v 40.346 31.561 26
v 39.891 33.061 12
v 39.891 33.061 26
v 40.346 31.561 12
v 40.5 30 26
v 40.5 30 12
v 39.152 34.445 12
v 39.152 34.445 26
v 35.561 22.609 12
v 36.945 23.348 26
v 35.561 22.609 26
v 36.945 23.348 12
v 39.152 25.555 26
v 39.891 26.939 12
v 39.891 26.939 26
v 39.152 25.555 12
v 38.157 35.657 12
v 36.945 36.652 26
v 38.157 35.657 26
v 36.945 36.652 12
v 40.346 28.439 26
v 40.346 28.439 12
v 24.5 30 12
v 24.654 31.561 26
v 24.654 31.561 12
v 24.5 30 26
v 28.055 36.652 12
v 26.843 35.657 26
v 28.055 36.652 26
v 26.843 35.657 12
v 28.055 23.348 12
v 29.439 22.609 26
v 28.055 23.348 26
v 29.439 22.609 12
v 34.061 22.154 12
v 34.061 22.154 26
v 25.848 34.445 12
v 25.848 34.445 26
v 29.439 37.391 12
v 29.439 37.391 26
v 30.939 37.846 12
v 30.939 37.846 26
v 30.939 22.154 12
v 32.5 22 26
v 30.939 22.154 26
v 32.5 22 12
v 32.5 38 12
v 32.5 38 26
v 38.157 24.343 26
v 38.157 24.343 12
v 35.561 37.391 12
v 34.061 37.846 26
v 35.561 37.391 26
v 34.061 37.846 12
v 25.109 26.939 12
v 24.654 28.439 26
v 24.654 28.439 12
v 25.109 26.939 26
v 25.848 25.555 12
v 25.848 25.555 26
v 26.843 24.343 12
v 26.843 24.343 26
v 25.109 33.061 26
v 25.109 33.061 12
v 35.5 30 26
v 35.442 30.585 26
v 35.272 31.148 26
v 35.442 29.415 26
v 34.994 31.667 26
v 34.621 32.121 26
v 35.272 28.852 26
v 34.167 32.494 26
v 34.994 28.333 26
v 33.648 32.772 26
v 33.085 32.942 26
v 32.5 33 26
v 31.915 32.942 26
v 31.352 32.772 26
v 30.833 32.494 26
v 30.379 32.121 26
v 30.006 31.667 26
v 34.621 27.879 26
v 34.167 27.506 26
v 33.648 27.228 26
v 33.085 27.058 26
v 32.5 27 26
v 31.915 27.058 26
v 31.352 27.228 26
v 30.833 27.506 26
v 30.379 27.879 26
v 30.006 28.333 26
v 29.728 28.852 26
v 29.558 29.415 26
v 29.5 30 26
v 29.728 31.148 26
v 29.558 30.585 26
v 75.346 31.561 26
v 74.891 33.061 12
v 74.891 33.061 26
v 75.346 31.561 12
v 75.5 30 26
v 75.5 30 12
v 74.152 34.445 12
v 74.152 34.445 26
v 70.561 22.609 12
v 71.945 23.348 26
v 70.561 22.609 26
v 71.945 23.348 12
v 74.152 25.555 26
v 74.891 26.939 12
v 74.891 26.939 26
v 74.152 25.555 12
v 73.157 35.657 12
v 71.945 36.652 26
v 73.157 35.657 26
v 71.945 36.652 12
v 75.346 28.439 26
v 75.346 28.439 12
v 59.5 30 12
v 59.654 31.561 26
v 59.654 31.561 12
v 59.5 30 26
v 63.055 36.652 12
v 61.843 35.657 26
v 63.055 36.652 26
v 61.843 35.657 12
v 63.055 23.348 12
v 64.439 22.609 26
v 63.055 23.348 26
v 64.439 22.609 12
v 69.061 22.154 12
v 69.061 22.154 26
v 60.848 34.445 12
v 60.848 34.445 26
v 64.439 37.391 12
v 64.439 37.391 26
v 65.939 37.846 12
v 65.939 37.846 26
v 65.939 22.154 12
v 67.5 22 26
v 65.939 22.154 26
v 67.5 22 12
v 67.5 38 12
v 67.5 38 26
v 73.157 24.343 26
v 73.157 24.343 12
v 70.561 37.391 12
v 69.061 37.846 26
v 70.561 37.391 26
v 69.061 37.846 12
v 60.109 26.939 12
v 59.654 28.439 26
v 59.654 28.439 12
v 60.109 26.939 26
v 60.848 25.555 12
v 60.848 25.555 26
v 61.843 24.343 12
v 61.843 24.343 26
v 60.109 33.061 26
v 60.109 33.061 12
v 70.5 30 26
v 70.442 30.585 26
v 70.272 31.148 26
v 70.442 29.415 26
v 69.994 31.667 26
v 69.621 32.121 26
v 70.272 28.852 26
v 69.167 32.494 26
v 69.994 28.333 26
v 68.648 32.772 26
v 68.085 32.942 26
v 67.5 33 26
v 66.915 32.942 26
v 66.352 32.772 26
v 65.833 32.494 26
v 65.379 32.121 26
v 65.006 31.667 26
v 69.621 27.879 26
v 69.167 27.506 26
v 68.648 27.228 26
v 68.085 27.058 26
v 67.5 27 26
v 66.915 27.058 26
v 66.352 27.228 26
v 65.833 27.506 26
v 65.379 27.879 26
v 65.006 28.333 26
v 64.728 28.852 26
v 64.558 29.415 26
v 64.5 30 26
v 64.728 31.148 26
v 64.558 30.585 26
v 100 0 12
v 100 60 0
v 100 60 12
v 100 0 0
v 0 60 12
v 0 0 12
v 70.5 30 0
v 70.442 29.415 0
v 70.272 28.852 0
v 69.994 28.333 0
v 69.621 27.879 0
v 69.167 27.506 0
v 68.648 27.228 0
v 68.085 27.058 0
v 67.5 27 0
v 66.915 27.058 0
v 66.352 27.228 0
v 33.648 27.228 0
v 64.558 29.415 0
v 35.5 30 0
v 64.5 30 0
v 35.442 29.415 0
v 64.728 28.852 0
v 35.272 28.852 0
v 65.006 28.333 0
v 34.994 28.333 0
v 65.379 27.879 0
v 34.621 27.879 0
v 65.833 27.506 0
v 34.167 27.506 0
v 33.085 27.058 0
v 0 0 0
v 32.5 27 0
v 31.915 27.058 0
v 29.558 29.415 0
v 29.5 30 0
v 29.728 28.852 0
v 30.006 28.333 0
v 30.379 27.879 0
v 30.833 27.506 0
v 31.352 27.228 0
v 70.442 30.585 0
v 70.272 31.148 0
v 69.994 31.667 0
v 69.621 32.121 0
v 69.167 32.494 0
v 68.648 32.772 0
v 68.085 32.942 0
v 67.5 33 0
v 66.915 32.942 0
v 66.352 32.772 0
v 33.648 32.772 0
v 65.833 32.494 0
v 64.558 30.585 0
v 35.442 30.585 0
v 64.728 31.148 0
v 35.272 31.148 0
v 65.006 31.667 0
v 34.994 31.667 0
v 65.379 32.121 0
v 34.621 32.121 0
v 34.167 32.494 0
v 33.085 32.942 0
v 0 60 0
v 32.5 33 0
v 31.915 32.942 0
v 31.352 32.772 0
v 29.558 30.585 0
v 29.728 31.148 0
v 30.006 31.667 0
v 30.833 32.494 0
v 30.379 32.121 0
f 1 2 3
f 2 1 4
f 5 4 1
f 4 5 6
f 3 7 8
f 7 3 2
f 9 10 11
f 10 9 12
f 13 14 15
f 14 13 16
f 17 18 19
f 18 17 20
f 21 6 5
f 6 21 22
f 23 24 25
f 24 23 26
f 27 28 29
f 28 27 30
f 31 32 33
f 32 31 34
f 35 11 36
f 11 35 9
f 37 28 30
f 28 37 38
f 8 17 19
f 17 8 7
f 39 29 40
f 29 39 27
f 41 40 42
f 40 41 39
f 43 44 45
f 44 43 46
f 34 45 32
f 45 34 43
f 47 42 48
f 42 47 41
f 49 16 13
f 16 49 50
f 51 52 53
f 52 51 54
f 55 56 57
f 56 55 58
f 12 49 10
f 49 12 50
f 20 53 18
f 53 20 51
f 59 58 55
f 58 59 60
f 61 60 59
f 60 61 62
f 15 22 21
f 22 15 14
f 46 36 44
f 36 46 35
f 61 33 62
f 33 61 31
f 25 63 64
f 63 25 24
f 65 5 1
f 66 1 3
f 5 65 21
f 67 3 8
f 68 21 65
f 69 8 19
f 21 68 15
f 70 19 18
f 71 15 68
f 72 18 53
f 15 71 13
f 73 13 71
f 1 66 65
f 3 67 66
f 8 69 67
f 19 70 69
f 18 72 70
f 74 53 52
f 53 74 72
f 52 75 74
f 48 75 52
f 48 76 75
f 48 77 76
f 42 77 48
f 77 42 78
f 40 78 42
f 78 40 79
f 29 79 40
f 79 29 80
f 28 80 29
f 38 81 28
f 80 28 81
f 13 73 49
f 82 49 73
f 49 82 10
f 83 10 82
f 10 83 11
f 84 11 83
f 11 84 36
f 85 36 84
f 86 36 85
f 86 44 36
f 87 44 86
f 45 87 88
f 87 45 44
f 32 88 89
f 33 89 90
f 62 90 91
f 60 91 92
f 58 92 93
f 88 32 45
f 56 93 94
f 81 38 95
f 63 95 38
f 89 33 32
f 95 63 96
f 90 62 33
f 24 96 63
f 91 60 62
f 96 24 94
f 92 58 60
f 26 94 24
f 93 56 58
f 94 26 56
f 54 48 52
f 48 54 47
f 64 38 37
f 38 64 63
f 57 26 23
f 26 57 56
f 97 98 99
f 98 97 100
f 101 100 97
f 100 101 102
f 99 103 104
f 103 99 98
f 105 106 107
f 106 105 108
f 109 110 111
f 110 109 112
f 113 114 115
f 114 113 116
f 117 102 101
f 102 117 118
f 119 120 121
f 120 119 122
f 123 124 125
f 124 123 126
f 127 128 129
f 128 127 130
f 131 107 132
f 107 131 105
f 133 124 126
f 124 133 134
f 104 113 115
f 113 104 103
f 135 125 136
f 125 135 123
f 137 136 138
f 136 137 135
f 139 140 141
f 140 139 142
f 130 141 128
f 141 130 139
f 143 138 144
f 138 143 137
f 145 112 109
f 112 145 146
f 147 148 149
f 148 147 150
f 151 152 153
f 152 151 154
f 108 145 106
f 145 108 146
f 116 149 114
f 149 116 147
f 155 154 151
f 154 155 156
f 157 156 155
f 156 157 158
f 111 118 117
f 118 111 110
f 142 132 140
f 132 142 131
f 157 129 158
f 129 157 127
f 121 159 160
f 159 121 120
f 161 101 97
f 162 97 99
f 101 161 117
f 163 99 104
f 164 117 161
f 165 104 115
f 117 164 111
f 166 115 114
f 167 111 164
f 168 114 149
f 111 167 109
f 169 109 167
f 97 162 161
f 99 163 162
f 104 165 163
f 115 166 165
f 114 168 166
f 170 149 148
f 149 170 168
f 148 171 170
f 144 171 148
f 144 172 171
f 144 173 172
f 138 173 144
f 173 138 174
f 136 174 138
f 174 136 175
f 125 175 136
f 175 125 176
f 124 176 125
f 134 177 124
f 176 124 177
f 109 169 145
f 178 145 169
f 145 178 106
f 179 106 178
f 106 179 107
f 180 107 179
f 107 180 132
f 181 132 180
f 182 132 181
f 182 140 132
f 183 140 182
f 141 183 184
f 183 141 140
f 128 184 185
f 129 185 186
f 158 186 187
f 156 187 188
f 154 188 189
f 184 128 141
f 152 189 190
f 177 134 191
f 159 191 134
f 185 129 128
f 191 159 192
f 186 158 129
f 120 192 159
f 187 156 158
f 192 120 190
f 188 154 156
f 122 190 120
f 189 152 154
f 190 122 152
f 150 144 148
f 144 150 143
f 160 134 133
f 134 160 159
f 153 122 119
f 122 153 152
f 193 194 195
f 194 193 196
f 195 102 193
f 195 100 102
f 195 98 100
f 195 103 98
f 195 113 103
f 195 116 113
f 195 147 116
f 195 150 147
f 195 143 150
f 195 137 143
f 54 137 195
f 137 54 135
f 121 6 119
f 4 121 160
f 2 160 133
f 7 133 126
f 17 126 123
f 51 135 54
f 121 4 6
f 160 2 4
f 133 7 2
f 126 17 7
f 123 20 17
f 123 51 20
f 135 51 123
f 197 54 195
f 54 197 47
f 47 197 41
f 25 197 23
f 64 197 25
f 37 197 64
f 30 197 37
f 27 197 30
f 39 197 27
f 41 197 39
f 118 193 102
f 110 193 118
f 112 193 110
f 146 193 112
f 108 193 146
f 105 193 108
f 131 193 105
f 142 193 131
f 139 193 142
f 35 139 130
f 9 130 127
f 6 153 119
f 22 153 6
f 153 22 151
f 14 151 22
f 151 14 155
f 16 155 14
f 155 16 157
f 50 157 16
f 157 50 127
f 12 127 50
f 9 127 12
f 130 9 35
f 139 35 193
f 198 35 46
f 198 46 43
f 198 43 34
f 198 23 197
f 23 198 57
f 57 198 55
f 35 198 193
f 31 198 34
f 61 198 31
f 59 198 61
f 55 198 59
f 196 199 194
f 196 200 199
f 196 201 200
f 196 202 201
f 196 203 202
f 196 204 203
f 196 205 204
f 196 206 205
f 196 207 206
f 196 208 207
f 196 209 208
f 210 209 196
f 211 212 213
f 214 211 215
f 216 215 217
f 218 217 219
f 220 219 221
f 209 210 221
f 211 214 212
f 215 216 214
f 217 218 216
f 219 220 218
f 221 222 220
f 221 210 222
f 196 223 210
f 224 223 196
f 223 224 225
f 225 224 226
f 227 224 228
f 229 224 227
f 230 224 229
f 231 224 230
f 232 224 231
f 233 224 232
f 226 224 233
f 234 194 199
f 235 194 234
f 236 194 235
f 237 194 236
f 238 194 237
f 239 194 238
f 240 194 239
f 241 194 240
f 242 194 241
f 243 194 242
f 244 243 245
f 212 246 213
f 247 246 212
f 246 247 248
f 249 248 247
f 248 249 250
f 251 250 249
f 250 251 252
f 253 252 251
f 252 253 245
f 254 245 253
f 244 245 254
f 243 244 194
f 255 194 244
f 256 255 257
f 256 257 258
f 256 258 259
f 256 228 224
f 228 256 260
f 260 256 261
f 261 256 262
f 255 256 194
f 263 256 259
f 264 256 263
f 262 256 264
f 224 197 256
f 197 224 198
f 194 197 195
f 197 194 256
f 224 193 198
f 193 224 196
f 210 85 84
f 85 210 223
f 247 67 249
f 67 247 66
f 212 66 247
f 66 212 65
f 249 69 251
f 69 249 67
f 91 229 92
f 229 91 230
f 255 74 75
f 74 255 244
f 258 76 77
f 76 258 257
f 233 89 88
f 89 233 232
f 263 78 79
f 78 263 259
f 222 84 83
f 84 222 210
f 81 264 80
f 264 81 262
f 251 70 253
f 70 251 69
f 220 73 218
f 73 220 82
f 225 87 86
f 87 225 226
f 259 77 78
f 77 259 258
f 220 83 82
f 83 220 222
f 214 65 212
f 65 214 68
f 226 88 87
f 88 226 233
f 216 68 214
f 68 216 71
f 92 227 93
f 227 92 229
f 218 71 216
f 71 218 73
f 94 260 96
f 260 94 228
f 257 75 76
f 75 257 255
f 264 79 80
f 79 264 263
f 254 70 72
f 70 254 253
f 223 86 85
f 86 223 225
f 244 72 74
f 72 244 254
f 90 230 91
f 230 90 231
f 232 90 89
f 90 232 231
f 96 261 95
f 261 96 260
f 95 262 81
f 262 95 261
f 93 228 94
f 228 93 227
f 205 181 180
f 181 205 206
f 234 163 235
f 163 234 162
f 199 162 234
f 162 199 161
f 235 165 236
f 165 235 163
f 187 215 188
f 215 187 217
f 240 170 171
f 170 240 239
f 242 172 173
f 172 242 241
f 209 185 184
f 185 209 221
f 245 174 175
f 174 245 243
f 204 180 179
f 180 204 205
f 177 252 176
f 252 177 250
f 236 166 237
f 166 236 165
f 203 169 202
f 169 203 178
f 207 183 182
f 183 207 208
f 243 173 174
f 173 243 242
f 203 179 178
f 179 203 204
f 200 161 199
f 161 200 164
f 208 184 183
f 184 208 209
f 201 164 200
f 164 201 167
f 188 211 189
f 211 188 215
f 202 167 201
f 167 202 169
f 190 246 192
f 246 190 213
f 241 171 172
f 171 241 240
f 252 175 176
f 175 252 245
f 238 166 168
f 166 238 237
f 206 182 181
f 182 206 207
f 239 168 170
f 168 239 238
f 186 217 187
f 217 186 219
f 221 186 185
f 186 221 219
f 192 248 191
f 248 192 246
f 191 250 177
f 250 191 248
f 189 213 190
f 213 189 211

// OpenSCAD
$fn = 32;

// ----------------------------------------------------------------------
// Drill jig: two_boss jig
// ----------------------------------------------------------------------

// --- parameters (mm) ---
plate_l = 100;            // plate length, X
plate_w = 60;             // plate width, Y
plate_t = 12;             // plate thickness
boss_d = 16;              // guide boss diameter
boss_h = 15;              // boss height above the plate
guide_d = 6;              // guide hole diameter
boss_pitch = 35;          // boss pitch

n_boss = 2;  // guide bosses
boss_x0 = (plate_l - (n_boss - 1) * boss_pitch) / 2;  // first boss X
boss_top = plate_t - 1 + boss_h;  // boss crown height
total_h = boss_top;  // overall height

difference() {
  union() {
  cube([plate_l, plate_w, plate_t]);
  for (i = [0 : n_boss - 1])
    translate([boss_x0 + i * boss_pitch, plate_w / 2, plate_t - 1])
      cylinder(h = boss_h, d = boss_d);
  }
  for (i = [0 : n_boss - 1])
    translate([boss_x0 + i * boss_pitch, plate_w / 2, -1])
      cylinder(h = plate_t + boss_h, d = guide_d);
}
